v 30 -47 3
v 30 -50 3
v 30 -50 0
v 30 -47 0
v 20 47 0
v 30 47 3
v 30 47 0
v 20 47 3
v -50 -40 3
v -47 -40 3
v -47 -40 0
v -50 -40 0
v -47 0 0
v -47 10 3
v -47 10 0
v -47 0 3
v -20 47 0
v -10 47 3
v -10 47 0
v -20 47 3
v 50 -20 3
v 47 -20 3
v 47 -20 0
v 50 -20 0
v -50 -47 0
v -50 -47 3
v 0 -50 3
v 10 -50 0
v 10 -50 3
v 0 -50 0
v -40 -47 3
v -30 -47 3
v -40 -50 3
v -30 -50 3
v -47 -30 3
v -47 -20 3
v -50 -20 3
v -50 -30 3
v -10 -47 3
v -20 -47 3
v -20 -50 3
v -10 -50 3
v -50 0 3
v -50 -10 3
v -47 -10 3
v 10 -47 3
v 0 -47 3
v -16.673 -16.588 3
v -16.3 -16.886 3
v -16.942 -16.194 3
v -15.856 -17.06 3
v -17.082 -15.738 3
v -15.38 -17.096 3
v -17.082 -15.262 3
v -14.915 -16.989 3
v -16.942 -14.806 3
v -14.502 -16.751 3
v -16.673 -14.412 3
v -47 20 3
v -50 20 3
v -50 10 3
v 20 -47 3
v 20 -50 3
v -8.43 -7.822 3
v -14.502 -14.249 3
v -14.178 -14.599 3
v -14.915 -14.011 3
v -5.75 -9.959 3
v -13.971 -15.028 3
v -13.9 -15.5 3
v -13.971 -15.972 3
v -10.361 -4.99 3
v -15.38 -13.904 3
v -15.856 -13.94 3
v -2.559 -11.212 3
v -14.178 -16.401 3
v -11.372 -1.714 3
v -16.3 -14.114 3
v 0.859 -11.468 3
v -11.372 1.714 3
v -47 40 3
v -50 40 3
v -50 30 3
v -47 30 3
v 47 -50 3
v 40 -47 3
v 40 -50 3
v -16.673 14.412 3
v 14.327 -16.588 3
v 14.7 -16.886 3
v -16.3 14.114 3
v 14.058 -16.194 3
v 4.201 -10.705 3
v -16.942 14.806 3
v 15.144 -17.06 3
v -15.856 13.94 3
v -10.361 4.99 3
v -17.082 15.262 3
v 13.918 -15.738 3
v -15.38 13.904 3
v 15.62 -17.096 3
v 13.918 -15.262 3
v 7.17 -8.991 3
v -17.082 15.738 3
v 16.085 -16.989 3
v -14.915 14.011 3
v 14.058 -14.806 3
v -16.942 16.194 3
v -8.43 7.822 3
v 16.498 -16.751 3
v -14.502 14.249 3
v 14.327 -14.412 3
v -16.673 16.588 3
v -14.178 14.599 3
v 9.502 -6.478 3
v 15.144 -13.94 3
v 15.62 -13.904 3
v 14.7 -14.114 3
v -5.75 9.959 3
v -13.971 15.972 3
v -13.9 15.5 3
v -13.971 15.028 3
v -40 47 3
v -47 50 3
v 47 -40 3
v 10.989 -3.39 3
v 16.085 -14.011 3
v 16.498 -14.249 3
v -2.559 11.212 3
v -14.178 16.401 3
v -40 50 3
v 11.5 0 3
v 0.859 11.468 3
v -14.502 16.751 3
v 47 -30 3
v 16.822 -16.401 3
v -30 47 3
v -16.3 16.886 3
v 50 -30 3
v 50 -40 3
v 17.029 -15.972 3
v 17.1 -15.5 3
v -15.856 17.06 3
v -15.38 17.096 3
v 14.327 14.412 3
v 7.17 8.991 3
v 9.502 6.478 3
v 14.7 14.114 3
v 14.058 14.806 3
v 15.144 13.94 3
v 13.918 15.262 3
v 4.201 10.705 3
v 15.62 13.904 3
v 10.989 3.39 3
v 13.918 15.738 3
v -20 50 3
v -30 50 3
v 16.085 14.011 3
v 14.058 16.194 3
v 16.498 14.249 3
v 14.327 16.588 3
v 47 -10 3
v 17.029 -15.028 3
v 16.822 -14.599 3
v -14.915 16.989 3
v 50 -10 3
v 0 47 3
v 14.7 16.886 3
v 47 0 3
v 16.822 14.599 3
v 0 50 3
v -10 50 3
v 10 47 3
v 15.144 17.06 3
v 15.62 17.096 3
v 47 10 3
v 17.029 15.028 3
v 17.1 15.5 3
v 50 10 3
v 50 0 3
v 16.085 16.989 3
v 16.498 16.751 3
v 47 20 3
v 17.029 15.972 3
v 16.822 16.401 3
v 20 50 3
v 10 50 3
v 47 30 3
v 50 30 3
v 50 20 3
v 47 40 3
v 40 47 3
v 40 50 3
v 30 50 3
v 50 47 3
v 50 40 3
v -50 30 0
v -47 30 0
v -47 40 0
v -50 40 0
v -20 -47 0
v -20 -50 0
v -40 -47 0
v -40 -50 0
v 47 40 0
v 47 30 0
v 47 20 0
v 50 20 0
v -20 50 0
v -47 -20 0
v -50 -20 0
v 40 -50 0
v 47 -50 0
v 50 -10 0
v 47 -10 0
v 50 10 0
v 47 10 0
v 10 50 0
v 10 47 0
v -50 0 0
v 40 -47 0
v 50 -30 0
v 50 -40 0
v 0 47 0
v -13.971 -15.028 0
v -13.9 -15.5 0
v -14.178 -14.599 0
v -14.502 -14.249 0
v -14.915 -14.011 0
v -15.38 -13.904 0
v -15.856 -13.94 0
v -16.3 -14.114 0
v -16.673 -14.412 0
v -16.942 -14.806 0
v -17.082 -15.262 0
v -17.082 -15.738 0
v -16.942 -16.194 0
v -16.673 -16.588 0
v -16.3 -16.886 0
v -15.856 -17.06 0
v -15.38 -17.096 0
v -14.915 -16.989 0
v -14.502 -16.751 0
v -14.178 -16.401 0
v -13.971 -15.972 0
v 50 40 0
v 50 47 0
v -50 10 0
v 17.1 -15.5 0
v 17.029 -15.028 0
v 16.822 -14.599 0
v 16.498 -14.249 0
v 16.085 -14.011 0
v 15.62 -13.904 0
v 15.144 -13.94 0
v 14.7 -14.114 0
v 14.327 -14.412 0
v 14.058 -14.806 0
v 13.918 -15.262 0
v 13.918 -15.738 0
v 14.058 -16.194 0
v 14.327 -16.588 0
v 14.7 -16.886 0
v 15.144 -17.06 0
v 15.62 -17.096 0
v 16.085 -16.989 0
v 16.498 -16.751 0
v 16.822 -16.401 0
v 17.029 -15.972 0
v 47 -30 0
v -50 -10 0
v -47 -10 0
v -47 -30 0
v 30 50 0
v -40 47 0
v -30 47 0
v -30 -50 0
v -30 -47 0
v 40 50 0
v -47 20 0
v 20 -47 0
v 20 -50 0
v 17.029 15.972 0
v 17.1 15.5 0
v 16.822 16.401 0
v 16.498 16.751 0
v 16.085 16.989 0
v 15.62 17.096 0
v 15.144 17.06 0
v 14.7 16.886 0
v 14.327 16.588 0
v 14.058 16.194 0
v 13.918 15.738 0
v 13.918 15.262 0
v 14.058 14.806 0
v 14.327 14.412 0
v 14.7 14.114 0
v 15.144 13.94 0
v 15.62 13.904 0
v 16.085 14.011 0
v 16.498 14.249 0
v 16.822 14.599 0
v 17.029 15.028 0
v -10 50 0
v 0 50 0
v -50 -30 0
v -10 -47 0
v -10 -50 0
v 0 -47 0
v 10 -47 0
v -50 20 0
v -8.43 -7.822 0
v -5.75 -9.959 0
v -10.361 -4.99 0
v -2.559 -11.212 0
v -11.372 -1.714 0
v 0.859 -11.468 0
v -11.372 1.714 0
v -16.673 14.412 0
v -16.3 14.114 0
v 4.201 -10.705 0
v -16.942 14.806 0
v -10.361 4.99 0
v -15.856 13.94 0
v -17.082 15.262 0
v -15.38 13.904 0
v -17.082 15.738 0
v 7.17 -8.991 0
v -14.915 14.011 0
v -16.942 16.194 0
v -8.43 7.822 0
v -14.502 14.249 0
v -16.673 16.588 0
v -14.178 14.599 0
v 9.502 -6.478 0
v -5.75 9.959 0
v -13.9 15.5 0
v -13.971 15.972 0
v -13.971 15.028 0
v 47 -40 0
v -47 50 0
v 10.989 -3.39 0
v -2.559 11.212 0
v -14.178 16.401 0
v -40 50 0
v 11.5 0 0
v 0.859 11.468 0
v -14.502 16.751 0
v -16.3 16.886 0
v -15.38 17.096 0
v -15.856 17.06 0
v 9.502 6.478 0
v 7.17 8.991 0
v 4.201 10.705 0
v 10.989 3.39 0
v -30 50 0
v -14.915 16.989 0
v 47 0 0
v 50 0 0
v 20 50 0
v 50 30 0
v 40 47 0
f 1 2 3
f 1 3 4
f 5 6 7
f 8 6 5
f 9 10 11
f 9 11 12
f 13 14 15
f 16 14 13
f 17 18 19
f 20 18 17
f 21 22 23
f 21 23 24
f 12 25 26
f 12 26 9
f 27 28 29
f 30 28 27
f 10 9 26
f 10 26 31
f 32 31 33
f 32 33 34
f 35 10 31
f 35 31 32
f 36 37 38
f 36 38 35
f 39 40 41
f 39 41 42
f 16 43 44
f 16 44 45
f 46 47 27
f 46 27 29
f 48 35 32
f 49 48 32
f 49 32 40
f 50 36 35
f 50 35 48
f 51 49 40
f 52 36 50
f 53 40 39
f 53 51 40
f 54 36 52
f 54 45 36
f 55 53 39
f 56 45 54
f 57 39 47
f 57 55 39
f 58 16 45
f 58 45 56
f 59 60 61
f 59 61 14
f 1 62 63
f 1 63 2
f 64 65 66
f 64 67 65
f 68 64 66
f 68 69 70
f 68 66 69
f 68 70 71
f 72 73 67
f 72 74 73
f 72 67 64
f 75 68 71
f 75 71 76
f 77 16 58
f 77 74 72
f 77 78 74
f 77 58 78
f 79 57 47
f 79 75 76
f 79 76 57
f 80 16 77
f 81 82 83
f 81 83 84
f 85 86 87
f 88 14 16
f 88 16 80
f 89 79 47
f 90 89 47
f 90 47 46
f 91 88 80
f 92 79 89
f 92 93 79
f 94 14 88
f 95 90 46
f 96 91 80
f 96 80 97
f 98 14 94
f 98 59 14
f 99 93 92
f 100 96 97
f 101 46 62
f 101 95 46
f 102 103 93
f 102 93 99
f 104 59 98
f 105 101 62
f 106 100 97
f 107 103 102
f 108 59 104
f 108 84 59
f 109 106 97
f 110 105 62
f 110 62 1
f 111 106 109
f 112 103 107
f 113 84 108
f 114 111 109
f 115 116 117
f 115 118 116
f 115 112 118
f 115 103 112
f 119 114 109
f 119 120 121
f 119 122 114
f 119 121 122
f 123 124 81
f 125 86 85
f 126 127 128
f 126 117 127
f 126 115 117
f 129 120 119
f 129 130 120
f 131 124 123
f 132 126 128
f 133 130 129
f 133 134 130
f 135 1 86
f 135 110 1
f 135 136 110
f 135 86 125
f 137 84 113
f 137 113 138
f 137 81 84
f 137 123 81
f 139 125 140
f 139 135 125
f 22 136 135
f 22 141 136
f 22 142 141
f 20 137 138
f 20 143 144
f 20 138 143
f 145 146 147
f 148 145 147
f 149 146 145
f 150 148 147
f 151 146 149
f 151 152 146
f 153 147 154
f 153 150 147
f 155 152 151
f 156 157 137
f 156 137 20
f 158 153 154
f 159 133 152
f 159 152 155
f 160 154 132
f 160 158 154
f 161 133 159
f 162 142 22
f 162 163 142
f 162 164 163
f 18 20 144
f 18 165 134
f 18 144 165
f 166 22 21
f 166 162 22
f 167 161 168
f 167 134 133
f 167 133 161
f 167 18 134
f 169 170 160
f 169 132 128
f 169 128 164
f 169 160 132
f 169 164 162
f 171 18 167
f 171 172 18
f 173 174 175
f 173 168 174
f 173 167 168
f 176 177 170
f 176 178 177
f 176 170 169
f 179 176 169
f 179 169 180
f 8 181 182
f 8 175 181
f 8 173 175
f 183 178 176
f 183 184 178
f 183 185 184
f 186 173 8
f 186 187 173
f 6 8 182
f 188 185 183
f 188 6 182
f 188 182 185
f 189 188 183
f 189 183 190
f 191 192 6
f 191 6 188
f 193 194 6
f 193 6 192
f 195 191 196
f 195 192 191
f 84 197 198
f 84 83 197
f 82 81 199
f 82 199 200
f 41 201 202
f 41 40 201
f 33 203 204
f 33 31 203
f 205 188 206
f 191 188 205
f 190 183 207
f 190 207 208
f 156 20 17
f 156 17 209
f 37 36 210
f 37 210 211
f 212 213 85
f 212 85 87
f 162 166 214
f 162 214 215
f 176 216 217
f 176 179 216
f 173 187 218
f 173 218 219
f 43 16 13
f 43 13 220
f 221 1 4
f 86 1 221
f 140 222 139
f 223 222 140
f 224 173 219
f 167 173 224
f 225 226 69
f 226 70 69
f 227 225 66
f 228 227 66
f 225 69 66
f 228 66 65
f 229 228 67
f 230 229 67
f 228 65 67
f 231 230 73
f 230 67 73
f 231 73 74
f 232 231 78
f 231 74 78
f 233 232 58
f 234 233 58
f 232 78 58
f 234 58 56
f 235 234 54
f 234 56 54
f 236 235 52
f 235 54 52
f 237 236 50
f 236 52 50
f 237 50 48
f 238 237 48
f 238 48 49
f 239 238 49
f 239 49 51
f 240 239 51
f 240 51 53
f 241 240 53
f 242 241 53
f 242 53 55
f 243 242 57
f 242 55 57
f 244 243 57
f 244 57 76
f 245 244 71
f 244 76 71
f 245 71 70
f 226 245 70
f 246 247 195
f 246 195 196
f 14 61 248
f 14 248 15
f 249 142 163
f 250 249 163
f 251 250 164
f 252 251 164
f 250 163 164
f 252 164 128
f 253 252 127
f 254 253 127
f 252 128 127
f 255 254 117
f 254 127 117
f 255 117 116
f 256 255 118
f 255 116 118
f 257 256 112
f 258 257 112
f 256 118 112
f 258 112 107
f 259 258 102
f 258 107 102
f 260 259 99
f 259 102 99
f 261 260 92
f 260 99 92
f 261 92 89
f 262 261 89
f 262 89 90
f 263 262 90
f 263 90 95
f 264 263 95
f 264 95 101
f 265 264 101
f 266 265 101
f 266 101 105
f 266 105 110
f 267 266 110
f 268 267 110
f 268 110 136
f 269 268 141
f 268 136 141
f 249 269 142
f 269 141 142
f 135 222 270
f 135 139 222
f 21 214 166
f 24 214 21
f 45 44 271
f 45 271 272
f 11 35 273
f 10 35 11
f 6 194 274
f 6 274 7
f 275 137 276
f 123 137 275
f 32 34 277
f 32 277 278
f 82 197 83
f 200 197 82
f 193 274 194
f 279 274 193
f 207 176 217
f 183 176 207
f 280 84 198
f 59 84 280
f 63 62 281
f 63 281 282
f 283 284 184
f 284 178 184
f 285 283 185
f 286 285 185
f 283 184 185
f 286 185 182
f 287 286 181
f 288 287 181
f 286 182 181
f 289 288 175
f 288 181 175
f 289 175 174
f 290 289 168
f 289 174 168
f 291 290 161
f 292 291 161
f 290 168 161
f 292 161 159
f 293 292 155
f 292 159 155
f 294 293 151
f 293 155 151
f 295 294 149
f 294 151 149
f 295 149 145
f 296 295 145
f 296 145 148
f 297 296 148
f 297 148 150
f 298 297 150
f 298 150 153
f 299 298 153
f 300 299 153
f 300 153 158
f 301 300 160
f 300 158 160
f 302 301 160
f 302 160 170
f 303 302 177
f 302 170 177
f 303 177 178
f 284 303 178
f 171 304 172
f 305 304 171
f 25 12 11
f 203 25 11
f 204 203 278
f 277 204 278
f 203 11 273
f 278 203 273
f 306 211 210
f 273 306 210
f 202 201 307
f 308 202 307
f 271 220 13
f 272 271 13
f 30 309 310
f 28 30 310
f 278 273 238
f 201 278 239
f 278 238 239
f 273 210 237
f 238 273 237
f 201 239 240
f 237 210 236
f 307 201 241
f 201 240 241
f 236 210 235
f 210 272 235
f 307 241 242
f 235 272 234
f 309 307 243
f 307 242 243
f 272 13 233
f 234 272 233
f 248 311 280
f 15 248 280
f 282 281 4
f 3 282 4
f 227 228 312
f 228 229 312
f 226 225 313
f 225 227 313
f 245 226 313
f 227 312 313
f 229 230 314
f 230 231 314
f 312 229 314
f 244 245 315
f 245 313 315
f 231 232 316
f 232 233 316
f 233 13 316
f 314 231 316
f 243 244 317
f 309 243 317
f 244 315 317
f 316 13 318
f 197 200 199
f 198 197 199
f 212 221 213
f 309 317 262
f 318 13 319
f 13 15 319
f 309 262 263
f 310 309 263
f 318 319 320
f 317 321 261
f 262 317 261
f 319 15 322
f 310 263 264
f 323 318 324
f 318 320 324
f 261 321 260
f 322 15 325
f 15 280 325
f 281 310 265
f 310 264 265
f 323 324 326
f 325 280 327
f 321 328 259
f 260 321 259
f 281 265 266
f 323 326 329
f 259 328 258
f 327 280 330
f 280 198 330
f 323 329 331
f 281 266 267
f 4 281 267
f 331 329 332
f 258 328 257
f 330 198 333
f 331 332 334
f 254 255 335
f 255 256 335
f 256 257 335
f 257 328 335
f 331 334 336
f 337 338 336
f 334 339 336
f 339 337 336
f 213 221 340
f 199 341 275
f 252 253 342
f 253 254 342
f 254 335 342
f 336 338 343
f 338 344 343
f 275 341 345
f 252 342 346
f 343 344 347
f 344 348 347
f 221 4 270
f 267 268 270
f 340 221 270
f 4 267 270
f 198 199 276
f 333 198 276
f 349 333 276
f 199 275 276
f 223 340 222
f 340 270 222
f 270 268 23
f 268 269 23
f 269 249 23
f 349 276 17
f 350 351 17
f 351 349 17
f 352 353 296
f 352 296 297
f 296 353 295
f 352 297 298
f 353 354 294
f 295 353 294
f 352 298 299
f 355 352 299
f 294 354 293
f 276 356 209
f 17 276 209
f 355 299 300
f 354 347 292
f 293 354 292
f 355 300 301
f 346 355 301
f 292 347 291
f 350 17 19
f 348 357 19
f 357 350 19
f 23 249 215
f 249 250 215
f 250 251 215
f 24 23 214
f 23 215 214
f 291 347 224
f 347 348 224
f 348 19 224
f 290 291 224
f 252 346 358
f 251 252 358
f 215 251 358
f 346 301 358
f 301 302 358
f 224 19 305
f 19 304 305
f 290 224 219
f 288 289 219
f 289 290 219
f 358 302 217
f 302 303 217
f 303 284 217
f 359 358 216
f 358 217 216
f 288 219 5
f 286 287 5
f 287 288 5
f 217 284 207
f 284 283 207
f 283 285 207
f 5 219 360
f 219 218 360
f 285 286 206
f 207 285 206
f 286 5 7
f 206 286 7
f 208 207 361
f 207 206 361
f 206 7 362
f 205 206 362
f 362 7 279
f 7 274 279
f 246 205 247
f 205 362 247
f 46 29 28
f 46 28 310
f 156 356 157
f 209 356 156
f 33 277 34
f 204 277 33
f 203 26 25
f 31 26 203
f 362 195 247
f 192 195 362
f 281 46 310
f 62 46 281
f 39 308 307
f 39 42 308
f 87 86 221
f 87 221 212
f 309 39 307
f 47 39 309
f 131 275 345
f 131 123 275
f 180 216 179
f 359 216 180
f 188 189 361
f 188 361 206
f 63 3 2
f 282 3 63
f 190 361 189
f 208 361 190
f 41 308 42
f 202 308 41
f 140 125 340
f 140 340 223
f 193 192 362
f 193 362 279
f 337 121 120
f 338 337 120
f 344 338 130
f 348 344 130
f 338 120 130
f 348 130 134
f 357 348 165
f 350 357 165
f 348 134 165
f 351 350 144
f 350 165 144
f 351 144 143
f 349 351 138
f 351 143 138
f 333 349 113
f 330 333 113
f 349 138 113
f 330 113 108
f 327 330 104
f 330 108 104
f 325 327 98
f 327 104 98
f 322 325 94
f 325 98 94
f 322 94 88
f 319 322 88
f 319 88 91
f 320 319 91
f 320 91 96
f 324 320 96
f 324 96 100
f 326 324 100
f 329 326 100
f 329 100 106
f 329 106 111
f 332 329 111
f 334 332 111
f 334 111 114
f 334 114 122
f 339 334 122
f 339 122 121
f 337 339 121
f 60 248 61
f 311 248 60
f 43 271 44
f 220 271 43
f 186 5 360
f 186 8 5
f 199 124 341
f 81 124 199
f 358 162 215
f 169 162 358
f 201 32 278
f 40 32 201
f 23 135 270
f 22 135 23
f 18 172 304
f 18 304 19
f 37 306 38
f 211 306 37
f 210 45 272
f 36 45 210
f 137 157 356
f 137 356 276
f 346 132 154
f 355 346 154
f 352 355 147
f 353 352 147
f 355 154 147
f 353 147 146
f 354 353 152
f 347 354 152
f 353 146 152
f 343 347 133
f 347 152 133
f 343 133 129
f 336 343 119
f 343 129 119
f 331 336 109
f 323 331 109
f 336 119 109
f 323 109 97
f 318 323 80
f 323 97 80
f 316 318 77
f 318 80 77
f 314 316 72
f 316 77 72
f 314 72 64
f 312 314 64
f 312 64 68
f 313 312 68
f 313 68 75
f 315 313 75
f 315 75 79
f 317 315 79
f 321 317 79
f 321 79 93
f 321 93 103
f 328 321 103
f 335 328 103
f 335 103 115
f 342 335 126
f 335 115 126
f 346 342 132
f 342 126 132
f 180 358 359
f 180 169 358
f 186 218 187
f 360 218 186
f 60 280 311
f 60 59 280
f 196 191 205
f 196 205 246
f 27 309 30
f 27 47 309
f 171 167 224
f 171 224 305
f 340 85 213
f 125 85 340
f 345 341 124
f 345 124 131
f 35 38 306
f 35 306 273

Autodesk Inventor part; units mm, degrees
ref_plane "YZ Plane" through (0, 0, 0) normal (1, 0, 0) x (0, 1, 0)
ref_plane "XZ Plane" through (0, 0, 0) normal (0, 1, 0) x (-1, 0, 0)
ref_plane "XY Plane" through (0, 0, 0) normal (0, 0, 1) x (1, 0, 0)
sketch "Sketch1" plane through (0, 0, 0) normal (0, 0, 1) x (1, 0, 0)
  line L0 (50, -50) -> (-50, -50)
  line L1 (-50, -50) -> (-50, 50)
  line L2 (-50, 50) -> (50, 50)
  line L3 (50, 50) -> (50, -50)
  line L4 (50, -50) -> (-50, 50) construction
  line L5 (-50, -50) -> (50, 50) construction
  point P0 (0, 0)
  dimension "d0" = 100
extrude "Extrusion1" add sketch "Sketch1" along normal blind 3
sketch "Sketch2" plane through (0, 0, 3) normal (0, 0, 1) x (1, 0, 0)
  line L0 (-50, 50) -> (-50, -50) construction
  line L1 (-47, 40) -> (-50, 40)
  line L2 (-50, 40) -> (-50, 50)
  line L3 (-50, 50) -> (-47, 50)
  line L4 (-47, 50) -> (-47, 40)
  line L5 (-47, 40) -> (-50, 50) construction
  line L6 (-50, 40) -> (-47, 50) construction
  point P0 (0, 0)
  point P1 (-48.5, 45)
  dimension "d3" = 10
  dimension "d4" = 3
extrude "Extrusion2" cut sketch "Sketch2" against normal through all
pattern_linear "Rectangular Pattern1" count 5 spacing 20 along (0, -1, 0) of "Extrusion2"
pattern_circular "Circular Pattern1" count 4 over 360 about axis through (0, 0, -10) along (0, 0, 1) of "Extrusion2", "Rectangular Pattern1"
sketch "Sketch3" plane through (0, 0, 3) normal (0, 0, 1) x (1, 0, 0)
  line L0 (15.5, -15.5) -> (-15.5, -15.5) construction
  line L1 (-15.5, -15.5) -> (-15.5, 15.5) construction
  line L2 (-15.5, 15.5) -> (15.5, 15.5) construction
  line L3 (15.5, 15.5) -> (15.5, -15.5) construction
  line L4 (15.5, -15.5) -> (-15.5, 15.5) construction
  line L5 (-15.5, -15.5) -> (15.5, 15.5) construction
  circle A0 centre (-15.5, 15.5) radius 1.6
  circle A1 centre (-15.5, -15.5) radius 1.6
  circle A2 centre (15.5, -15.5) radius 1.6
  circle A3 centre (15.5, 15.5) radius 1.6
  circle A4 centre (0, 0) radius 11.5
  dimension "d13" = 31
  dimension "d14" = 3.2
  dimension "d17" = 23
extrude "Extrusion3" cut sketch "Sketch3" against normal through all
properties part number "Base"
